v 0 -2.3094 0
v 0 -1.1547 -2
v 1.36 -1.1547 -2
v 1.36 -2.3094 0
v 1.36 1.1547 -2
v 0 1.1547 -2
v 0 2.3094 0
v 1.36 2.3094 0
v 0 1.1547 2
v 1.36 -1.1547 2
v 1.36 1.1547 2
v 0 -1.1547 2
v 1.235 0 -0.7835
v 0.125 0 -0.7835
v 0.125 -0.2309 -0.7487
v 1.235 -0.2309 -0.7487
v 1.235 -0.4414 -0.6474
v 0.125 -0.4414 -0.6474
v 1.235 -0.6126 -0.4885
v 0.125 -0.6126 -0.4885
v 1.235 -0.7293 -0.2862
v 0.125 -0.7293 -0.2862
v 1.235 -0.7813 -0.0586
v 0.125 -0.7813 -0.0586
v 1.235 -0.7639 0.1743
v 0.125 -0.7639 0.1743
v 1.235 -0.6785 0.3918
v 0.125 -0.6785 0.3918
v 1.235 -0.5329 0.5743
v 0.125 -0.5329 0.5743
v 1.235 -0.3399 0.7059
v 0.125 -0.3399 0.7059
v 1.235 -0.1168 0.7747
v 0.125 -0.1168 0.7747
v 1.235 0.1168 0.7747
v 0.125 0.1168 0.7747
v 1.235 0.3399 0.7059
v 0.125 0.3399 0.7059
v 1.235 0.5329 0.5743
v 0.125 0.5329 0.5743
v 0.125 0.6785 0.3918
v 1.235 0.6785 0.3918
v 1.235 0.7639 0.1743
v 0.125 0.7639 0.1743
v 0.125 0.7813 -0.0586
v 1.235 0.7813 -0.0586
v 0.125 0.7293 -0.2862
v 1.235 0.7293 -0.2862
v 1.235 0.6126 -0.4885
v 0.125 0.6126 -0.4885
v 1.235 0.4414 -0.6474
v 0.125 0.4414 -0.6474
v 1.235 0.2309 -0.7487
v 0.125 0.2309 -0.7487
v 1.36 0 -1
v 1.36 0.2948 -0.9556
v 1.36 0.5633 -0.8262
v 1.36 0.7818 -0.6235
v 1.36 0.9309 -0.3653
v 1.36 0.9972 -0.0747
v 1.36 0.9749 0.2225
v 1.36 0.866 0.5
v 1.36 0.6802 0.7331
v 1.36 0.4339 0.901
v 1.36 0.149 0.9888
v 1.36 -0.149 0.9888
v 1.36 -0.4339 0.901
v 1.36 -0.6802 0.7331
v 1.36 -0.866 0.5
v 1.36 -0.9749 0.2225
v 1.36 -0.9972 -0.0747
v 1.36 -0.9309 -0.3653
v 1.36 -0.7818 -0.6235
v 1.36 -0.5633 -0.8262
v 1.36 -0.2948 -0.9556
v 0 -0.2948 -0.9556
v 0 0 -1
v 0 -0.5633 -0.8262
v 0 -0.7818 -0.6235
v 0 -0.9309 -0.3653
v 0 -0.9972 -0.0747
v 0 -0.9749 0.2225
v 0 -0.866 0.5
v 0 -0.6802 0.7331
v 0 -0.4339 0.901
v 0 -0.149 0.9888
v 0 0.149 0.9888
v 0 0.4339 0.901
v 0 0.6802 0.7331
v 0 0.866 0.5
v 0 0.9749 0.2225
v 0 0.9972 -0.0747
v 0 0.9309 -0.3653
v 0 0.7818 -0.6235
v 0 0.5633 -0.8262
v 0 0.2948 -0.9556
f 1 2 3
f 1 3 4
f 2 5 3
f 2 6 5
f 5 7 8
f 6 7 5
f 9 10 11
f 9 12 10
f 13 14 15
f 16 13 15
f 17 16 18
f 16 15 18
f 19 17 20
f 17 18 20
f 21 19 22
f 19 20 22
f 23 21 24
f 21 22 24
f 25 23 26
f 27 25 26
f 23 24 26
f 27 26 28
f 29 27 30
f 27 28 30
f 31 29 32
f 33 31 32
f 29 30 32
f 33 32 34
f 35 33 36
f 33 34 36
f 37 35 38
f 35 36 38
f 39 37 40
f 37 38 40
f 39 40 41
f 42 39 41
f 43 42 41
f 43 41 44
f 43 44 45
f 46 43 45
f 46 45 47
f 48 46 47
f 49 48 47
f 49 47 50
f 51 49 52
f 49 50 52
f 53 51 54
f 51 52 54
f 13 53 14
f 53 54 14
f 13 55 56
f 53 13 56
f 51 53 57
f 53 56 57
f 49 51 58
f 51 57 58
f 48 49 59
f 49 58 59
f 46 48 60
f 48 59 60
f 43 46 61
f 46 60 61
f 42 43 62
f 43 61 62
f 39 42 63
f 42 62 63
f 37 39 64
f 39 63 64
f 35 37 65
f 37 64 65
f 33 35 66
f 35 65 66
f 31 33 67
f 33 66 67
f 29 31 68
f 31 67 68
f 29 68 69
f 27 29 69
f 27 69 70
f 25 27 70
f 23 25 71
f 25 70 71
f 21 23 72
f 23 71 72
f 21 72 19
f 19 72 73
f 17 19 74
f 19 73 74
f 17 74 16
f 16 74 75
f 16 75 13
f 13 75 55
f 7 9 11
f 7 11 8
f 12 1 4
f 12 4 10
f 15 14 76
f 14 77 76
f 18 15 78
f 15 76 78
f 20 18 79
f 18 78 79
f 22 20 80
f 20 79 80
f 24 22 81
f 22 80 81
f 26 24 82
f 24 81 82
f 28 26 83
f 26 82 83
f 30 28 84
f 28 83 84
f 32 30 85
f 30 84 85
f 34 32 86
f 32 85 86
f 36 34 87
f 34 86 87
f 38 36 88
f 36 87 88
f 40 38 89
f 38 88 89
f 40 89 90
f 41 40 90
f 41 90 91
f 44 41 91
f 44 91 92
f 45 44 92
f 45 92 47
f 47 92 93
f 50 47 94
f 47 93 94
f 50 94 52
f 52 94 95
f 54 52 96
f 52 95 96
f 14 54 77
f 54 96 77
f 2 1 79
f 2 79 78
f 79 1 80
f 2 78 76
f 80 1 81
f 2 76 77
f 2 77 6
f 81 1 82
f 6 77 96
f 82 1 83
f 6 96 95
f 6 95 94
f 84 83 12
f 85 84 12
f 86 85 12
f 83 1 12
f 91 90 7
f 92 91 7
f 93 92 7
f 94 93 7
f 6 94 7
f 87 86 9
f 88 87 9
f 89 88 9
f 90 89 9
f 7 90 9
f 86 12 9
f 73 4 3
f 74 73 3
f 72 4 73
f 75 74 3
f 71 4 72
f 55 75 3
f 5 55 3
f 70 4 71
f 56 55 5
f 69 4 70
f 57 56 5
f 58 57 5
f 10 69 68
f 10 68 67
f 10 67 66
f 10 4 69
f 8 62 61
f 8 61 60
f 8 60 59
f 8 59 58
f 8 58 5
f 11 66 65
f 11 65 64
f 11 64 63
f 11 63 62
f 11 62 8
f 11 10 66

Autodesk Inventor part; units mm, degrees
ref_plane "YZ Plane" through (0, 0, 0) normal (1, 0, 0) x (0, 1, 0)
ref_plane "XZ Plane" through (0, 0, 0) normal (0, 1, 0) x (-1, 0, 0)
sketch "Skizze1" plane through (0, 0, 0) normal (1, 0, 0) x (0, 1, 0)
  line L0 (1.1547, -2) -> (-1.1547, -2)
  line L1 (-1.1547, -2) -> (-2.3094, 0)
  line L2 (-2.3094, 0) -> (-1.1547, 2)
  line L3 (-1.1547, 2) -> (1.1547, 2)
  line L4 (1.1547, 2) -> (2.3094, 0)
  line L5 (2.3094, 0) -> (1.1547, -2)
  point P0 (0, 0)
  point P1 (0, 0)
  dimension "d0" = 4.6188
extrude "Körper" add sketch "Skizze1" along normal blind 1.36
sketch "Skizze2" plane through (1.36, 0, 0) normal (1, 0, 0) x (0, 0, -1)
  point P0 (0, 0)
hole "Gewinde" at (1.36, 0, 0) direction (-1, 0, 0) diameter 1.567 end through all thread size "M2x0.4" class "6H" standard "ISO Metric profile"
chamfer "Fase2" distance 0.2165 angle 30 1 edges at (1.36, 0, 0.7835) measured on face at (1.36, -1.3696, -0.815)
chamfer "Fase1" distance 0.2165 angle 30 1 edges at (0, 0, 0.7835) measured on face at (0, -1.3696, -0.815)
ref_plane "Work Plane1" through (-4.8996, 0, 0) normal (0, 0, -1) x (1, 0, 0)
equation "\"d0\" = 1.1547 * SW"
equation "\"d1\" = KOH"
equation "\"d12\" = -0.5 * GD1 + 0.5 * NND"
equation "\"d19\" = -0.5 * GD1 + 0.5 * NND"
equation "\"d10\" = -0.5 * GD1 + 0.5 * NND"
equation "\"d18\" = -0.5 * GD1 + 0.5 * NND"
equation "\"NND\" = 2"
equation "\"KOH\" = 1.36"
equation "\"SW\" = 4"
equation "\"GUL\" = 0.541266 * PTC"
equation "\"THREADDIA\" = 2"
equation "\"TOA\" = 30deg"
equation "\"PTC\" = 0.4"
equation "\"E0\" = 1.155 * SW"
equation "\"GAL\" = 0.541266 * PTC"
equation "\"GD1\" = 1.566987"
properties part number "AS 1474 - M2" material "Stahl, weich"
